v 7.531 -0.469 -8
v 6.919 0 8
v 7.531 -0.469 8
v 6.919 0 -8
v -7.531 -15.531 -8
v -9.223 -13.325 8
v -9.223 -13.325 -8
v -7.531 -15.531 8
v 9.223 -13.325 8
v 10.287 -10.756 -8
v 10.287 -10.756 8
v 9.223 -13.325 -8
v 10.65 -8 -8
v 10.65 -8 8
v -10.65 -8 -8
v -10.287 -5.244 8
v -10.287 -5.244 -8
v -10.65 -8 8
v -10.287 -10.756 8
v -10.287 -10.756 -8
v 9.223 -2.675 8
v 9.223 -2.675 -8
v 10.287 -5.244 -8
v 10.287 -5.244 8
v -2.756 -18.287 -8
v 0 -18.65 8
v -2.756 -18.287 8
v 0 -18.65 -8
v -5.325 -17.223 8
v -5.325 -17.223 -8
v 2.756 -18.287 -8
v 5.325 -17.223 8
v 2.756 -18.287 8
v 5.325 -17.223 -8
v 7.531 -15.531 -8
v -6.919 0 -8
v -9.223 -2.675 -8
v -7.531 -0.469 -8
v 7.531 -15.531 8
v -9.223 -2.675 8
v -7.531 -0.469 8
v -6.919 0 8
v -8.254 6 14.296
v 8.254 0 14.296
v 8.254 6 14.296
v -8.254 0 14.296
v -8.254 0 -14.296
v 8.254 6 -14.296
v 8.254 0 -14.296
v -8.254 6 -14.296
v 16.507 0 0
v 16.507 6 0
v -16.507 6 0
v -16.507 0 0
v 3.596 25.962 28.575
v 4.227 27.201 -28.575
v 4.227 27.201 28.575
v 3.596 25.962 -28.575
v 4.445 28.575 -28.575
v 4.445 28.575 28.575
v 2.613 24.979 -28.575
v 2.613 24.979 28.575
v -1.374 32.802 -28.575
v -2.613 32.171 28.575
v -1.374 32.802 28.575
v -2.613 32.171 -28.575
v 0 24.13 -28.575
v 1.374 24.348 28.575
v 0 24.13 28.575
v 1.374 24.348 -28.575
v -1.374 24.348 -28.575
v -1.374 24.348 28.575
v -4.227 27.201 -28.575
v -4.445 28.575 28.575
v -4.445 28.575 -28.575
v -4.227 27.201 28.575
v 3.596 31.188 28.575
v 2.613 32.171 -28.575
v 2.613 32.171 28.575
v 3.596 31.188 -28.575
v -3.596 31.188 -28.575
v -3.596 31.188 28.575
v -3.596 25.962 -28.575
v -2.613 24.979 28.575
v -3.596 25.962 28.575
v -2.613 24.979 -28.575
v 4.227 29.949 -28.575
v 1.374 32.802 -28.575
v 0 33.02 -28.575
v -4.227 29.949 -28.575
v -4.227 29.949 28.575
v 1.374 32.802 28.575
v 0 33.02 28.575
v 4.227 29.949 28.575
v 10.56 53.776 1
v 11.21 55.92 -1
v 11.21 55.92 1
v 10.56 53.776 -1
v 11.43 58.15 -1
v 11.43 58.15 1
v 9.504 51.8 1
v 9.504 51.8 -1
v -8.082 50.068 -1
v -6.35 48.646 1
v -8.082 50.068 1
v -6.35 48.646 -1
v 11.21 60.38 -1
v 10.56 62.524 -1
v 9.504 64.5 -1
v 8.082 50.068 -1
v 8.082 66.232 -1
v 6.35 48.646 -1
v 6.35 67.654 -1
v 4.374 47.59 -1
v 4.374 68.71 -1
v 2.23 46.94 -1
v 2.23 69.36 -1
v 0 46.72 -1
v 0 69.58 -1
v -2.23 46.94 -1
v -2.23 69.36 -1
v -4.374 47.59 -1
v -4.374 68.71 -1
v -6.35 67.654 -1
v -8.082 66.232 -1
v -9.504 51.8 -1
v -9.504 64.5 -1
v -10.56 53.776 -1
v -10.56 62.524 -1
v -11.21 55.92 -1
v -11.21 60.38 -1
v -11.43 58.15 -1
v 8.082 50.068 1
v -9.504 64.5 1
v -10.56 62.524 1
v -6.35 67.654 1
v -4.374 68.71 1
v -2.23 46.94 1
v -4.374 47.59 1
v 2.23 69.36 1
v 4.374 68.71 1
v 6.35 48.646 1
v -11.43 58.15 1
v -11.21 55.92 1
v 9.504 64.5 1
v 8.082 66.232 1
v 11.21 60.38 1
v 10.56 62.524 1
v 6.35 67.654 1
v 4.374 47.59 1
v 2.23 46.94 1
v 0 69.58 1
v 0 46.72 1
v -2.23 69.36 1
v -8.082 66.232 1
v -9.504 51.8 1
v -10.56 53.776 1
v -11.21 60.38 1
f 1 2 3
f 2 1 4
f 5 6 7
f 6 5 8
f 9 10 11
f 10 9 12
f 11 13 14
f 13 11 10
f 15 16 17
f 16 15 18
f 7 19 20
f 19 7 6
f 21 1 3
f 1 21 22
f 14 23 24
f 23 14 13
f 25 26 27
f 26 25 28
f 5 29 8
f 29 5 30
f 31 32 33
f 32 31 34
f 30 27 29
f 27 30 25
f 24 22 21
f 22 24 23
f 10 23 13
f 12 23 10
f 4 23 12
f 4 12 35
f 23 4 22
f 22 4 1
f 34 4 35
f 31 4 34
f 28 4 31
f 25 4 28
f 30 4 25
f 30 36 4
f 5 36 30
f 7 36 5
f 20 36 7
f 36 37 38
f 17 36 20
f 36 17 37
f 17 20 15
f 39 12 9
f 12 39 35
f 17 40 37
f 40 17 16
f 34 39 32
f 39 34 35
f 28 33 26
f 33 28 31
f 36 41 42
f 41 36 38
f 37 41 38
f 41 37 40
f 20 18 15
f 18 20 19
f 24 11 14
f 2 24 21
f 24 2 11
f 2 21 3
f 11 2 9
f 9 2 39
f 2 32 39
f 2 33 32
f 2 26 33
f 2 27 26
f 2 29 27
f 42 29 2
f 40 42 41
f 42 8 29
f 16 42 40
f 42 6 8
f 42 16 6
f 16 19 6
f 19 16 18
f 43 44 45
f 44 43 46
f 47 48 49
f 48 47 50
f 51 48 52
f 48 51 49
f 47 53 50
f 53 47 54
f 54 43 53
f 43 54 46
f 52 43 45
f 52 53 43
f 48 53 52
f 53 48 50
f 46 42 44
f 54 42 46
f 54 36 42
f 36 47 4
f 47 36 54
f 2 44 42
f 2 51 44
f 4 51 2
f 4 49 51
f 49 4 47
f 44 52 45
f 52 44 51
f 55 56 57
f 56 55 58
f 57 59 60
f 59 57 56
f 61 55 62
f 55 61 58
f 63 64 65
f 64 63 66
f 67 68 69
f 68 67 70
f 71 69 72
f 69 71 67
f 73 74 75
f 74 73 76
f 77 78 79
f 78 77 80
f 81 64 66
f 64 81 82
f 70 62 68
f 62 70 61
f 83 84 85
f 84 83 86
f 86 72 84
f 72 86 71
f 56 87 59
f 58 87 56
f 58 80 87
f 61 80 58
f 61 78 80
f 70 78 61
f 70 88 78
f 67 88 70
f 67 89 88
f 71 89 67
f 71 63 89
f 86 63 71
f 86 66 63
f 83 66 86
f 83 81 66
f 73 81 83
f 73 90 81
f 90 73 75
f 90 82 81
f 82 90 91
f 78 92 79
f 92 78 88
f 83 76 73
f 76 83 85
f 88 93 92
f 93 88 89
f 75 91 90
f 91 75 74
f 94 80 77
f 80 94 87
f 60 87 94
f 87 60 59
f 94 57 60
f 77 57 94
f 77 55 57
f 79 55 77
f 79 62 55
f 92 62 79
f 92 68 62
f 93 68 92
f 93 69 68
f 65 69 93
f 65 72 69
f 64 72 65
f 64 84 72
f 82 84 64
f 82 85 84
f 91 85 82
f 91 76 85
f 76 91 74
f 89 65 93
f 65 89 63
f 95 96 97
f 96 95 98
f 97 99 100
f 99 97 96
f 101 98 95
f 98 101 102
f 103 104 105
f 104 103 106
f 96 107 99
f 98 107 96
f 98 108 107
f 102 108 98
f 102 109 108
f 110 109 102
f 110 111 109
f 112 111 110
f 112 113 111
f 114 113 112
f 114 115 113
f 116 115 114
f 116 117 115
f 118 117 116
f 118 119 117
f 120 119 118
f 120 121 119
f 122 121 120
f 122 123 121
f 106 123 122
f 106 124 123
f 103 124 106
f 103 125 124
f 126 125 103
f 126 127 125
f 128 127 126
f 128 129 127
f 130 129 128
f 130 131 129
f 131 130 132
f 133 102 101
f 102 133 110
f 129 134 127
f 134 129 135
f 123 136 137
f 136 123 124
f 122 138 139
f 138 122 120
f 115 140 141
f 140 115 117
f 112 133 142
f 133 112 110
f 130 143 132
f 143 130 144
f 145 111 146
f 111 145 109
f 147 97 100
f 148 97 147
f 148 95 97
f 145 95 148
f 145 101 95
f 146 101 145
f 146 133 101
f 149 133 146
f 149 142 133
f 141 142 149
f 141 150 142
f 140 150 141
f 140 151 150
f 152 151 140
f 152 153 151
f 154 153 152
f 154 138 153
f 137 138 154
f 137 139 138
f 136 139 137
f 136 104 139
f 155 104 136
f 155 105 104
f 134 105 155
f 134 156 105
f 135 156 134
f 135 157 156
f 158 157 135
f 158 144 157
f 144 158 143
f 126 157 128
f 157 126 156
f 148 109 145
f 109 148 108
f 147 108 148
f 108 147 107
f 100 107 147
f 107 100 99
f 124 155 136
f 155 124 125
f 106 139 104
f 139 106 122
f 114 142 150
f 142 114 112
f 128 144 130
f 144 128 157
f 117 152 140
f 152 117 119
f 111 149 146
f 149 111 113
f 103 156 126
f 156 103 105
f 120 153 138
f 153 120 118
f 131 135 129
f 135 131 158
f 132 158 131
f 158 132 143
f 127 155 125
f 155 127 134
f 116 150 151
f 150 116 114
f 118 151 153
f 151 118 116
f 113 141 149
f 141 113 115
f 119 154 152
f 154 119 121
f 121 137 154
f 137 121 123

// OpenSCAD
// Auto-generated by scripts/author_from_manifest.py (Phase D.3).
// Source: data/phase_d_manifest.json (sku_intent='reliable-f156-upright-286f').
// Do not hand-edit — regenerate from the manifest.
//
// @part reliable_f156_upright_286f
// @kind sprinkler_head
// @category head.upright.k56
// @display-name "Reliable F1-56 Upright K5.6 SR 286°F"
// @mfg reliable_automatic_sprinkler
// @mfg-pn F1-56
// @listing UL FM
// @hazard-classes LH OH1
// @price-usd 12.75
// @install-minutes 8
// @crew journeyman
// @k-factor 5.6
// @orientation upright
// @response standard
// @temperature 286F
// @param size_in number default=0.5 label="Size" unit="in"
// @port inlet position=[0,0.014,0] direction=[0,1,0] style=NPT_threaded size_in=0.5 role=drop

size_in = 0.5;
k_factor = 5.6;

length_mm   = 57.15;
body_dia_mm = 25.40;
thread_od   = 21.3;
thread_len  = 16;
deflector_d = body_dia_mm * 0.9;

rotate([180,0,0]) union() {
    translate([0, thread_len/2, 0])
        cylinder(h = thread_len, d = thread_od, center = true, $fn = 24);
    translate([0, -3, 0])
        rotate([90, 0, 0])
        cylinder(h = 6, d = thread_od * 1.55, $fn = 6, center = true);
    translate([0, -length_mm/2, 0])
        cylinder(h = length_mm, d = body_dia_mm * 0.35, center = true, $fn = 20);
    translate([0, -length_mm - 1, 0])
        cylinder(h = 2, d = deflector_d, center = true, $fn = 32);
}
